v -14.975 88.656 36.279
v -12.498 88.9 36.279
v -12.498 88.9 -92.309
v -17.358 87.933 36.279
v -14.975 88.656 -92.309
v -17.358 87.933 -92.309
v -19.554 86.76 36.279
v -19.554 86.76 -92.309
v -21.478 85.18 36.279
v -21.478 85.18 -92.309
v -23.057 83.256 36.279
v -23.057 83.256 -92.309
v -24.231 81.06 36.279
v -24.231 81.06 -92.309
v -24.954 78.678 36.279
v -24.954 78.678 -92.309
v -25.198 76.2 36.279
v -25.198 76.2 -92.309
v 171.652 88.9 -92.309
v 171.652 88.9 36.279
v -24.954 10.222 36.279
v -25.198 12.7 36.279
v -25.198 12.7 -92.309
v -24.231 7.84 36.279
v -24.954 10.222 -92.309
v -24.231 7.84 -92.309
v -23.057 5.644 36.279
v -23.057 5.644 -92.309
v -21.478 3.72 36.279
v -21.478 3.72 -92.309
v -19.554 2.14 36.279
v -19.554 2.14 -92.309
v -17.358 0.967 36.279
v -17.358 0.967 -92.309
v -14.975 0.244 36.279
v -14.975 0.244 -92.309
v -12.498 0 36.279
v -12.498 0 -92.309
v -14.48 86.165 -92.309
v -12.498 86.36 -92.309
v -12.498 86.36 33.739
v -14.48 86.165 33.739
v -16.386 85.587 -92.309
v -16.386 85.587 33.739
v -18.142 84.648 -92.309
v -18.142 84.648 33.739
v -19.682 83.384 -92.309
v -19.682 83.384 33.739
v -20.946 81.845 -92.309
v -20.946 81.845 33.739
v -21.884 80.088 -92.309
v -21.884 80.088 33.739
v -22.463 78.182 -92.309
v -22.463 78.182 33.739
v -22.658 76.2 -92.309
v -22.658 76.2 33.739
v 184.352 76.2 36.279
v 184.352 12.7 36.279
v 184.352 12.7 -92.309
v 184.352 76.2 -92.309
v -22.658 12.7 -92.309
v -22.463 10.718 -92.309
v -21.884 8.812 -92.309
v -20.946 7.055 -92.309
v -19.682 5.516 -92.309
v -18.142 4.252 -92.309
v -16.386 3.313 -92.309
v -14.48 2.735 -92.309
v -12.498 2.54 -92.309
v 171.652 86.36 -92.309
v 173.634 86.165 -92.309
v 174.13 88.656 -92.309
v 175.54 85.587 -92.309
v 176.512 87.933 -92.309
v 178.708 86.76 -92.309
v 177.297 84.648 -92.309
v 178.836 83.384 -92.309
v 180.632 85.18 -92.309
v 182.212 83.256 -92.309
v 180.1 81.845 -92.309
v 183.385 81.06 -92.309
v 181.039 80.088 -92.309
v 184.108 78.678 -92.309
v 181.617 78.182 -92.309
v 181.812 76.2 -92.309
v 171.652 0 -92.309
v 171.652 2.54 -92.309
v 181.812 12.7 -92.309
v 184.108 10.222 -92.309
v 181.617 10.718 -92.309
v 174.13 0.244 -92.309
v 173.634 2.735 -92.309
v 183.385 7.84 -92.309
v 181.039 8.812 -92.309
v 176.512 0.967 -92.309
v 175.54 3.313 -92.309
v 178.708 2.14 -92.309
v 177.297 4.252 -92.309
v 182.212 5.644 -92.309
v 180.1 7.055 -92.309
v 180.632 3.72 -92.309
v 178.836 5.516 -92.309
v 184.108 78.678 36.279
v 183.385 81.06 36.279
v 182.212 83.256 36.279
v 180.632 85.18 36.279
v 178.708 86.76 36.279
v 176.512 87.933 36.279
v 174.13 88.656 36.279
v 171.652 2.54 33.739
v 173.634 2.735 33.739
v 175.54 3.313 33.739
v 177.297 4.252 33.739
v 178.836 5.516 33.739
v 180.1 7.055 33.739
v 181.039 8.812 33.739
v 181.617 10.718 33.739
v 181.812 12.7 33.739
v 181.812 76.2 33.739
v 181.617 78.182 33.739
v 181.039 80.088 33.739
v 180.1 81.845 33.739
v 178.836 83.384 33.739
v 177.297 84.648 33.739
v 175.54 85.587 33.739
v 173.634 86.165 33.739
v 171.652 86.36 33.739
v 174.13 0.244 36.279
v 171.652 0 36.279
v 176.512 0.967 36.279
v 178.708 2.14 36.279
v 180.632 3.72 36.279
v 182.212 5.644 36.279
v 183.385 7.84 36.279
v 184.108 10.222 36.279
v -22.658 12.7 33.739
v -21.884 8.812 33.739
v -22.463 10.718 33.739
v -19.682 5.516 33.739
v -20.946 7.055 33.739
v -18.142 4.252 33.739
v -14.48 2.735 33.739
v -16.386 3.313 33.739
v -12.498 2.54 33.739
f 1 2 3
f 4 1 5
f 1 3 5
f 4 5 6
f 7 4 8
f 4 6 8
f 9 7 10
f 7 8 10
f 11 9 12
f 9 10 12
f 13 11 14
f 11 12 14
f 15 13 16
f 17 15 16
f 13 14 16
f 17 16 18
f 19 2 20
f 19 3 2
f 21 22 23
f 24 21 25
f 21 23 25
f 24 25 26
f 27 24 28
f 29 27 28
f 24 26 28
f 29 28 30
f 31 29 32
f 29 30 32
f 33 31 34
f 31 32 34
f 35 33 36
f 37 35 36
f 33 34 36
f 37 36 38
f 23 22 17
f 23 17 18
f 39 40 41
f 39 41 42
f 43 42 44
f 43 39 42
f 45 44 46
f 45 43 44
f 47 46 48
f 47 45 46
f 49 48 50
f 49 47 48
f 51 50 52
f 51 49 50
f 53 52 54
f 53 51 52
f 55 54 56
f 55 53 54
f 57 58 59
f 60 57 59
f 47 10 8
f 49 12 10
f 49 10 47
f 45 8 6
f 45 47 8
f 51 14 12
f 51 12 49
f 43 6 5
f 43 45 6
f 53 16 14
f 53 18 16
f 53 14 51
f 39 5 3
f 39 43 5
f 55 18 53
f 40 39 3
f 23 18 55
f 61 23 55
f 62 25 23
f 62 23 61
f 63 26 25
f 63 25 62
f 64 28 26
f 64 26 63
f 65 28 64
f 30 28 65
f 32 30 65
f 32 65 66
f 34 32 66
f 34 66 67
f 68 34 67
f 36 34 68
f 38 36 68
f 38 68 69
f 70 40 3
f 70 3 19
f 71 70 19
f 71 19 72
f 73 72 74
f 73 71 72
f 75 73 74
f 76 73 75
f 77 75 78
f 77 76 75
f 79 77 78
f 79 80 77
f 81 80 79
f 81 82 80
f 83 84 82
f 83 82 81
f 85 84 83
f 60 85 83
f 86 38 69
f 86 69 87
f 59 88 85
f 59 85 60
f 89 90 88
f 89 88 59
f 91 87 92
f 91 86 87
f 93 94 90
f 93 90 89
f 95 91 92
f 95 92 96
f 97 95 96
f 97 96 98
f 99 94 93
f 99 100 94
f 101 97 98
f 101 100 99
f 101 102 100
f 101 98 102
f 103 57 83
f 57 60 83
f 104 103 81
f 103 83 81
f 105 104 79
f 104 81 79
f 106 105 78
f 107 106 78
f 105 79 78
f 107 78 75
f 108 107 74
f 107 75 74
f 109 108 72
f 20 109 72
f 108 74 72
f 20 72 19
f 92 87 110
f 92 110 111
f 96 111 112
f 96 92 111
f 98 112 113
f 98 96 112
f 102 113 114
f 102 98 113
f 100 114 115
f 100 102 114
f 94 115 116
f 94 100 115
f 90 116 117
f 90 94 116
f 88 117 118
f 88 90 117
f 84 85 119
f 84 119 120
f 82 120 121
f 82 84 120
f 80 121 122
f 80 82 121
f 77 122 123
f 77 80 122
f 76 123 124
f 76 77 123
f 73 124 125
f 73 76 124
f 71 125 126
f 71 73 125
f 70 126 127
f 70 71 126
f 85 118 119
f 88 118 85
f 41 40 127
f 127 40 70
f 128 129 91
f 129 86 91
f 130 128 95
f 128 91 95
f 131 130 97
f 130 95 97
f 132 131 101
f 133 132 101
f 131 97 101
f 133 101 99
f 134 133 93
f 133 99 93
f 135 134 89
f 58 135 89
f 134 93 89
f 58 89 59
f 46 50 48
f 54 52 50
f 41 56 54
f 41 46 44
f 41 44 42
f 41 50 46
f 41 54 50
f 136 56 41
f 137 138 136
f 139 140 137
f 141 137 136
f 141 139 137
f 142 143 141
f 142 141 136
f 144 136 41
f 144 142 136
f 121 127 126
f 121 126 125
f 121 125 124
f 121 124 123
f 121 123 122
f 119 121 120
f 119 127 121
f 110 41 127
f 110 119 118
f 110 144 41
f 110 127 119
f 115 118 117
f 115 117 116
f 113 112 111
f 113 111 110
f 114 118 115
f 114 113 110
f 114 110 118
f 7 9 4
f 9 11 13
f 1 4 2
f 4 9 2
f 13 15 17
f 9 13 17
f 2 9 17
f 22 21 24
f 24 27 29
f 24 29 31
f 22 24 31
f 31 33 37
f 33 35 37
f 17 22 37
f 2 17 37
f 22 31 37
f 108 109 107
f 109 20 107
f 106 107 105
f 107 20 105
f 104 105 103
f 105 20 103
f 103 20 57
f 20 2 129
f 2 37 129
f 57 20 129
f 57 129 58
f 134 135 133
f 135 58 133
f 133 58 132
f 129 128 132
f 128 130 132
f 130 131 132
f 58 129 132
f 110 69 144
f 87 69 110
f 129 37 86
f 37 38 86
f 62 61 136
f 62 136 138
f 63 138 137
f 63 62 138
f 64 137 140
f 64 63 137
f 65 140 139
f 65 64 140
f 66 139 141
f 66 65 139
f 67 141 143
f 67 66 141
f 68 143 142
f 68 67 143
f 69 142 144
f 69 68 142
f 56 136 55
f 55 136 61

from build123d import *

# Parameters (mm, degrees)
SKETCH1_W           = 209.55
SKETCH1_H           = 128.5875
BOSS_EXTRUDE1_DEPTH = 88.9
FILLET1_R           = 12.7
FILLET2_R           = 12.7
FILLET3_R           = 12.7
FILLET4_R           = 12.7
SHELL1_T            = -2.54


with BuildPart() as part:
    # Sketch1 → Boss-Extrude1 (new body)
    with BuildSketch(Plane(origin=(0, 0, 0), x_dir=(1, 0, 0), z_dir=(0, 1, 0))):
        with Locations((79.577166722, 28.014941846)):
            Rectangle(SKETCH1_W, SKETCH1_H)
    extrude(amount=BOSS_EXTRUDE1_DEPTH)

    # Fillet1
    fillet1_edges = [part.edges().sort_by_distance(p)[0] for p in [
        (184.352166722, 88.9, -28.014941846),
    ]]
    fillet(fillet1_edges, radius=FILLET1_R)

    # Fillet2
    fillet2_edges = [part.edges().sort_by_distance(p)[0] for p in [
        (-25.197833278, 88.9, -28.014941846),
    ]]
    fillet(fillet2_edges, radius=FILLET2_R)

    # Fillet3
    fillet3_edges = [part.edges().sort_by_distance(p)[0] for p in [
        (-25.197833278, 0, -28.014941846),
    ]]
    fillet(fillet3_edges, radius=FILLET3_R)

    # Fillet4
    fillet4_edges = [part.edges().sort_by_distance(p)[0] for p in [
        (184.352166722, 0, -28.014941846),
    ]]
    fillet(fillet4_edges, radius=FILLET4_R)

    # Shell1
    shell1_openings = [part.faces().sort_by_distance(p)[0] for p in [
        (79.577166722, 44.45, -92.308691846),
    ]]
    offset(amount=SHELL1_T, openings=shell1_openings, kind=Kind.INTERSECTION)


solid = part.part
